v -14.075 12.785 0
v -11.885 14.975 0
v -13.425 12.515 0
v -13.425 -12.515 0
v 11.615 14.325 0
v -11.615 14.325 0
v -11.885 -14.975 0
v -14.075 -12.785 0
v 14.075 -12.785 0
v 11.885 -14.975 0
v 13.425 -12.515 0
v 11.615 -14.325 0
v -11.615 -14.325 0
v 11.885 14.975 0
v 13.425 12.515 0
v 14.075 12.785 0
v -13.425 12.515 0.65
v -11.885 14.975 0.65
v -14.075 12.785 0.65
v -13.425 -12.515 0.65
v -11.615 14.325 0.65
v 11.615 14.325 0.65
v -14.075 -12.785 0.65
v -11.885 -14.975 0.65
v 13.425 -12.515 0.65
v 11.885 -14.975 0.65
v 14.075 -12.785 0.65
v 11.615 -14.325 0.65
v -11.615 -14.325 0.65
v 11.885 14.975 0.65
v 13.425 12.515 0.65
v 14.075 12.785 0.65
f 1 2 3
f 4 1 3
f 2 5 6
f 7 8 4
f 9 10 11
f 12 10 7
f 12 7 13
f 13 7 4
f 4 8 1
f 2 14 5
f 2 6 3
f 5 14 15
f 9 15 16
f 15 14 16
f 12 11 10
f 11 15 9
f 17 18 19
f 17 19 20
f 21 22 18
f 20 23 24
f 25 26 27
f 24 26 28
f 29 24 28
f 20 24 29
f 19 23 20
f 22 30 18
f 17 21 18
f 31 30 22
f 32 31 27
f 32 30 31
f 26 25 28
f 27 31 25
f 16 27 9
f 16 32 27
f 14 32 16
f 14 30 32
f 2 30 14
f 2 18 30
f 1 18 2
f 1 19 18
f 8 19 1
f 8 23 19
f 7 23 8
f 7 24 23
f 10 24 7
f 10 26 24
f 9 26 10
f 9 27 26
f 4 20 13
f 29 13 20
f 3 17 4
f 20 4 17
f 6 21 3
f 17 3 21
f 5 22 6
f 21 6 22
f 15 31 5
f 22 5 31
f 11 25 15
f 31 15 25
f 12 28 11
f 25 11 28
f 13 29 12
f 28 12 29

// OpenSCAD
/* [Cross Section] */
csThck=0.65;
csWdth=0.65;
csShape="square"; //["square","round"]

/* [Dimensions (cntrLine)] */
ovWdth=27.5;
ovHght=29.3;
chamfer=2;
cornerStyle="chamfer";

$fn=50;

if (csShape=="square")
  if (cornerStyle=="chamfer")
    linear_extrude(csThck) difference(){
      offset(delta=csWdth/2,chamfer=false) chamfSquare([ovWdth,ovHght],chamfer);
      offset(delta=-csWdth/2,chamfer=false) chamfSquare([ovWdth,ovHght],chamfer);
      }
  
module chamfSquare(size=[10,10],chamfer=2){
  hull() for (ix=[-1,1],iy=[-1,1])
    translate([ix*(size.x/2-chamfer),iy*(size.y/2-chamfer)]) circle(chamfer,$fn=4);
}
